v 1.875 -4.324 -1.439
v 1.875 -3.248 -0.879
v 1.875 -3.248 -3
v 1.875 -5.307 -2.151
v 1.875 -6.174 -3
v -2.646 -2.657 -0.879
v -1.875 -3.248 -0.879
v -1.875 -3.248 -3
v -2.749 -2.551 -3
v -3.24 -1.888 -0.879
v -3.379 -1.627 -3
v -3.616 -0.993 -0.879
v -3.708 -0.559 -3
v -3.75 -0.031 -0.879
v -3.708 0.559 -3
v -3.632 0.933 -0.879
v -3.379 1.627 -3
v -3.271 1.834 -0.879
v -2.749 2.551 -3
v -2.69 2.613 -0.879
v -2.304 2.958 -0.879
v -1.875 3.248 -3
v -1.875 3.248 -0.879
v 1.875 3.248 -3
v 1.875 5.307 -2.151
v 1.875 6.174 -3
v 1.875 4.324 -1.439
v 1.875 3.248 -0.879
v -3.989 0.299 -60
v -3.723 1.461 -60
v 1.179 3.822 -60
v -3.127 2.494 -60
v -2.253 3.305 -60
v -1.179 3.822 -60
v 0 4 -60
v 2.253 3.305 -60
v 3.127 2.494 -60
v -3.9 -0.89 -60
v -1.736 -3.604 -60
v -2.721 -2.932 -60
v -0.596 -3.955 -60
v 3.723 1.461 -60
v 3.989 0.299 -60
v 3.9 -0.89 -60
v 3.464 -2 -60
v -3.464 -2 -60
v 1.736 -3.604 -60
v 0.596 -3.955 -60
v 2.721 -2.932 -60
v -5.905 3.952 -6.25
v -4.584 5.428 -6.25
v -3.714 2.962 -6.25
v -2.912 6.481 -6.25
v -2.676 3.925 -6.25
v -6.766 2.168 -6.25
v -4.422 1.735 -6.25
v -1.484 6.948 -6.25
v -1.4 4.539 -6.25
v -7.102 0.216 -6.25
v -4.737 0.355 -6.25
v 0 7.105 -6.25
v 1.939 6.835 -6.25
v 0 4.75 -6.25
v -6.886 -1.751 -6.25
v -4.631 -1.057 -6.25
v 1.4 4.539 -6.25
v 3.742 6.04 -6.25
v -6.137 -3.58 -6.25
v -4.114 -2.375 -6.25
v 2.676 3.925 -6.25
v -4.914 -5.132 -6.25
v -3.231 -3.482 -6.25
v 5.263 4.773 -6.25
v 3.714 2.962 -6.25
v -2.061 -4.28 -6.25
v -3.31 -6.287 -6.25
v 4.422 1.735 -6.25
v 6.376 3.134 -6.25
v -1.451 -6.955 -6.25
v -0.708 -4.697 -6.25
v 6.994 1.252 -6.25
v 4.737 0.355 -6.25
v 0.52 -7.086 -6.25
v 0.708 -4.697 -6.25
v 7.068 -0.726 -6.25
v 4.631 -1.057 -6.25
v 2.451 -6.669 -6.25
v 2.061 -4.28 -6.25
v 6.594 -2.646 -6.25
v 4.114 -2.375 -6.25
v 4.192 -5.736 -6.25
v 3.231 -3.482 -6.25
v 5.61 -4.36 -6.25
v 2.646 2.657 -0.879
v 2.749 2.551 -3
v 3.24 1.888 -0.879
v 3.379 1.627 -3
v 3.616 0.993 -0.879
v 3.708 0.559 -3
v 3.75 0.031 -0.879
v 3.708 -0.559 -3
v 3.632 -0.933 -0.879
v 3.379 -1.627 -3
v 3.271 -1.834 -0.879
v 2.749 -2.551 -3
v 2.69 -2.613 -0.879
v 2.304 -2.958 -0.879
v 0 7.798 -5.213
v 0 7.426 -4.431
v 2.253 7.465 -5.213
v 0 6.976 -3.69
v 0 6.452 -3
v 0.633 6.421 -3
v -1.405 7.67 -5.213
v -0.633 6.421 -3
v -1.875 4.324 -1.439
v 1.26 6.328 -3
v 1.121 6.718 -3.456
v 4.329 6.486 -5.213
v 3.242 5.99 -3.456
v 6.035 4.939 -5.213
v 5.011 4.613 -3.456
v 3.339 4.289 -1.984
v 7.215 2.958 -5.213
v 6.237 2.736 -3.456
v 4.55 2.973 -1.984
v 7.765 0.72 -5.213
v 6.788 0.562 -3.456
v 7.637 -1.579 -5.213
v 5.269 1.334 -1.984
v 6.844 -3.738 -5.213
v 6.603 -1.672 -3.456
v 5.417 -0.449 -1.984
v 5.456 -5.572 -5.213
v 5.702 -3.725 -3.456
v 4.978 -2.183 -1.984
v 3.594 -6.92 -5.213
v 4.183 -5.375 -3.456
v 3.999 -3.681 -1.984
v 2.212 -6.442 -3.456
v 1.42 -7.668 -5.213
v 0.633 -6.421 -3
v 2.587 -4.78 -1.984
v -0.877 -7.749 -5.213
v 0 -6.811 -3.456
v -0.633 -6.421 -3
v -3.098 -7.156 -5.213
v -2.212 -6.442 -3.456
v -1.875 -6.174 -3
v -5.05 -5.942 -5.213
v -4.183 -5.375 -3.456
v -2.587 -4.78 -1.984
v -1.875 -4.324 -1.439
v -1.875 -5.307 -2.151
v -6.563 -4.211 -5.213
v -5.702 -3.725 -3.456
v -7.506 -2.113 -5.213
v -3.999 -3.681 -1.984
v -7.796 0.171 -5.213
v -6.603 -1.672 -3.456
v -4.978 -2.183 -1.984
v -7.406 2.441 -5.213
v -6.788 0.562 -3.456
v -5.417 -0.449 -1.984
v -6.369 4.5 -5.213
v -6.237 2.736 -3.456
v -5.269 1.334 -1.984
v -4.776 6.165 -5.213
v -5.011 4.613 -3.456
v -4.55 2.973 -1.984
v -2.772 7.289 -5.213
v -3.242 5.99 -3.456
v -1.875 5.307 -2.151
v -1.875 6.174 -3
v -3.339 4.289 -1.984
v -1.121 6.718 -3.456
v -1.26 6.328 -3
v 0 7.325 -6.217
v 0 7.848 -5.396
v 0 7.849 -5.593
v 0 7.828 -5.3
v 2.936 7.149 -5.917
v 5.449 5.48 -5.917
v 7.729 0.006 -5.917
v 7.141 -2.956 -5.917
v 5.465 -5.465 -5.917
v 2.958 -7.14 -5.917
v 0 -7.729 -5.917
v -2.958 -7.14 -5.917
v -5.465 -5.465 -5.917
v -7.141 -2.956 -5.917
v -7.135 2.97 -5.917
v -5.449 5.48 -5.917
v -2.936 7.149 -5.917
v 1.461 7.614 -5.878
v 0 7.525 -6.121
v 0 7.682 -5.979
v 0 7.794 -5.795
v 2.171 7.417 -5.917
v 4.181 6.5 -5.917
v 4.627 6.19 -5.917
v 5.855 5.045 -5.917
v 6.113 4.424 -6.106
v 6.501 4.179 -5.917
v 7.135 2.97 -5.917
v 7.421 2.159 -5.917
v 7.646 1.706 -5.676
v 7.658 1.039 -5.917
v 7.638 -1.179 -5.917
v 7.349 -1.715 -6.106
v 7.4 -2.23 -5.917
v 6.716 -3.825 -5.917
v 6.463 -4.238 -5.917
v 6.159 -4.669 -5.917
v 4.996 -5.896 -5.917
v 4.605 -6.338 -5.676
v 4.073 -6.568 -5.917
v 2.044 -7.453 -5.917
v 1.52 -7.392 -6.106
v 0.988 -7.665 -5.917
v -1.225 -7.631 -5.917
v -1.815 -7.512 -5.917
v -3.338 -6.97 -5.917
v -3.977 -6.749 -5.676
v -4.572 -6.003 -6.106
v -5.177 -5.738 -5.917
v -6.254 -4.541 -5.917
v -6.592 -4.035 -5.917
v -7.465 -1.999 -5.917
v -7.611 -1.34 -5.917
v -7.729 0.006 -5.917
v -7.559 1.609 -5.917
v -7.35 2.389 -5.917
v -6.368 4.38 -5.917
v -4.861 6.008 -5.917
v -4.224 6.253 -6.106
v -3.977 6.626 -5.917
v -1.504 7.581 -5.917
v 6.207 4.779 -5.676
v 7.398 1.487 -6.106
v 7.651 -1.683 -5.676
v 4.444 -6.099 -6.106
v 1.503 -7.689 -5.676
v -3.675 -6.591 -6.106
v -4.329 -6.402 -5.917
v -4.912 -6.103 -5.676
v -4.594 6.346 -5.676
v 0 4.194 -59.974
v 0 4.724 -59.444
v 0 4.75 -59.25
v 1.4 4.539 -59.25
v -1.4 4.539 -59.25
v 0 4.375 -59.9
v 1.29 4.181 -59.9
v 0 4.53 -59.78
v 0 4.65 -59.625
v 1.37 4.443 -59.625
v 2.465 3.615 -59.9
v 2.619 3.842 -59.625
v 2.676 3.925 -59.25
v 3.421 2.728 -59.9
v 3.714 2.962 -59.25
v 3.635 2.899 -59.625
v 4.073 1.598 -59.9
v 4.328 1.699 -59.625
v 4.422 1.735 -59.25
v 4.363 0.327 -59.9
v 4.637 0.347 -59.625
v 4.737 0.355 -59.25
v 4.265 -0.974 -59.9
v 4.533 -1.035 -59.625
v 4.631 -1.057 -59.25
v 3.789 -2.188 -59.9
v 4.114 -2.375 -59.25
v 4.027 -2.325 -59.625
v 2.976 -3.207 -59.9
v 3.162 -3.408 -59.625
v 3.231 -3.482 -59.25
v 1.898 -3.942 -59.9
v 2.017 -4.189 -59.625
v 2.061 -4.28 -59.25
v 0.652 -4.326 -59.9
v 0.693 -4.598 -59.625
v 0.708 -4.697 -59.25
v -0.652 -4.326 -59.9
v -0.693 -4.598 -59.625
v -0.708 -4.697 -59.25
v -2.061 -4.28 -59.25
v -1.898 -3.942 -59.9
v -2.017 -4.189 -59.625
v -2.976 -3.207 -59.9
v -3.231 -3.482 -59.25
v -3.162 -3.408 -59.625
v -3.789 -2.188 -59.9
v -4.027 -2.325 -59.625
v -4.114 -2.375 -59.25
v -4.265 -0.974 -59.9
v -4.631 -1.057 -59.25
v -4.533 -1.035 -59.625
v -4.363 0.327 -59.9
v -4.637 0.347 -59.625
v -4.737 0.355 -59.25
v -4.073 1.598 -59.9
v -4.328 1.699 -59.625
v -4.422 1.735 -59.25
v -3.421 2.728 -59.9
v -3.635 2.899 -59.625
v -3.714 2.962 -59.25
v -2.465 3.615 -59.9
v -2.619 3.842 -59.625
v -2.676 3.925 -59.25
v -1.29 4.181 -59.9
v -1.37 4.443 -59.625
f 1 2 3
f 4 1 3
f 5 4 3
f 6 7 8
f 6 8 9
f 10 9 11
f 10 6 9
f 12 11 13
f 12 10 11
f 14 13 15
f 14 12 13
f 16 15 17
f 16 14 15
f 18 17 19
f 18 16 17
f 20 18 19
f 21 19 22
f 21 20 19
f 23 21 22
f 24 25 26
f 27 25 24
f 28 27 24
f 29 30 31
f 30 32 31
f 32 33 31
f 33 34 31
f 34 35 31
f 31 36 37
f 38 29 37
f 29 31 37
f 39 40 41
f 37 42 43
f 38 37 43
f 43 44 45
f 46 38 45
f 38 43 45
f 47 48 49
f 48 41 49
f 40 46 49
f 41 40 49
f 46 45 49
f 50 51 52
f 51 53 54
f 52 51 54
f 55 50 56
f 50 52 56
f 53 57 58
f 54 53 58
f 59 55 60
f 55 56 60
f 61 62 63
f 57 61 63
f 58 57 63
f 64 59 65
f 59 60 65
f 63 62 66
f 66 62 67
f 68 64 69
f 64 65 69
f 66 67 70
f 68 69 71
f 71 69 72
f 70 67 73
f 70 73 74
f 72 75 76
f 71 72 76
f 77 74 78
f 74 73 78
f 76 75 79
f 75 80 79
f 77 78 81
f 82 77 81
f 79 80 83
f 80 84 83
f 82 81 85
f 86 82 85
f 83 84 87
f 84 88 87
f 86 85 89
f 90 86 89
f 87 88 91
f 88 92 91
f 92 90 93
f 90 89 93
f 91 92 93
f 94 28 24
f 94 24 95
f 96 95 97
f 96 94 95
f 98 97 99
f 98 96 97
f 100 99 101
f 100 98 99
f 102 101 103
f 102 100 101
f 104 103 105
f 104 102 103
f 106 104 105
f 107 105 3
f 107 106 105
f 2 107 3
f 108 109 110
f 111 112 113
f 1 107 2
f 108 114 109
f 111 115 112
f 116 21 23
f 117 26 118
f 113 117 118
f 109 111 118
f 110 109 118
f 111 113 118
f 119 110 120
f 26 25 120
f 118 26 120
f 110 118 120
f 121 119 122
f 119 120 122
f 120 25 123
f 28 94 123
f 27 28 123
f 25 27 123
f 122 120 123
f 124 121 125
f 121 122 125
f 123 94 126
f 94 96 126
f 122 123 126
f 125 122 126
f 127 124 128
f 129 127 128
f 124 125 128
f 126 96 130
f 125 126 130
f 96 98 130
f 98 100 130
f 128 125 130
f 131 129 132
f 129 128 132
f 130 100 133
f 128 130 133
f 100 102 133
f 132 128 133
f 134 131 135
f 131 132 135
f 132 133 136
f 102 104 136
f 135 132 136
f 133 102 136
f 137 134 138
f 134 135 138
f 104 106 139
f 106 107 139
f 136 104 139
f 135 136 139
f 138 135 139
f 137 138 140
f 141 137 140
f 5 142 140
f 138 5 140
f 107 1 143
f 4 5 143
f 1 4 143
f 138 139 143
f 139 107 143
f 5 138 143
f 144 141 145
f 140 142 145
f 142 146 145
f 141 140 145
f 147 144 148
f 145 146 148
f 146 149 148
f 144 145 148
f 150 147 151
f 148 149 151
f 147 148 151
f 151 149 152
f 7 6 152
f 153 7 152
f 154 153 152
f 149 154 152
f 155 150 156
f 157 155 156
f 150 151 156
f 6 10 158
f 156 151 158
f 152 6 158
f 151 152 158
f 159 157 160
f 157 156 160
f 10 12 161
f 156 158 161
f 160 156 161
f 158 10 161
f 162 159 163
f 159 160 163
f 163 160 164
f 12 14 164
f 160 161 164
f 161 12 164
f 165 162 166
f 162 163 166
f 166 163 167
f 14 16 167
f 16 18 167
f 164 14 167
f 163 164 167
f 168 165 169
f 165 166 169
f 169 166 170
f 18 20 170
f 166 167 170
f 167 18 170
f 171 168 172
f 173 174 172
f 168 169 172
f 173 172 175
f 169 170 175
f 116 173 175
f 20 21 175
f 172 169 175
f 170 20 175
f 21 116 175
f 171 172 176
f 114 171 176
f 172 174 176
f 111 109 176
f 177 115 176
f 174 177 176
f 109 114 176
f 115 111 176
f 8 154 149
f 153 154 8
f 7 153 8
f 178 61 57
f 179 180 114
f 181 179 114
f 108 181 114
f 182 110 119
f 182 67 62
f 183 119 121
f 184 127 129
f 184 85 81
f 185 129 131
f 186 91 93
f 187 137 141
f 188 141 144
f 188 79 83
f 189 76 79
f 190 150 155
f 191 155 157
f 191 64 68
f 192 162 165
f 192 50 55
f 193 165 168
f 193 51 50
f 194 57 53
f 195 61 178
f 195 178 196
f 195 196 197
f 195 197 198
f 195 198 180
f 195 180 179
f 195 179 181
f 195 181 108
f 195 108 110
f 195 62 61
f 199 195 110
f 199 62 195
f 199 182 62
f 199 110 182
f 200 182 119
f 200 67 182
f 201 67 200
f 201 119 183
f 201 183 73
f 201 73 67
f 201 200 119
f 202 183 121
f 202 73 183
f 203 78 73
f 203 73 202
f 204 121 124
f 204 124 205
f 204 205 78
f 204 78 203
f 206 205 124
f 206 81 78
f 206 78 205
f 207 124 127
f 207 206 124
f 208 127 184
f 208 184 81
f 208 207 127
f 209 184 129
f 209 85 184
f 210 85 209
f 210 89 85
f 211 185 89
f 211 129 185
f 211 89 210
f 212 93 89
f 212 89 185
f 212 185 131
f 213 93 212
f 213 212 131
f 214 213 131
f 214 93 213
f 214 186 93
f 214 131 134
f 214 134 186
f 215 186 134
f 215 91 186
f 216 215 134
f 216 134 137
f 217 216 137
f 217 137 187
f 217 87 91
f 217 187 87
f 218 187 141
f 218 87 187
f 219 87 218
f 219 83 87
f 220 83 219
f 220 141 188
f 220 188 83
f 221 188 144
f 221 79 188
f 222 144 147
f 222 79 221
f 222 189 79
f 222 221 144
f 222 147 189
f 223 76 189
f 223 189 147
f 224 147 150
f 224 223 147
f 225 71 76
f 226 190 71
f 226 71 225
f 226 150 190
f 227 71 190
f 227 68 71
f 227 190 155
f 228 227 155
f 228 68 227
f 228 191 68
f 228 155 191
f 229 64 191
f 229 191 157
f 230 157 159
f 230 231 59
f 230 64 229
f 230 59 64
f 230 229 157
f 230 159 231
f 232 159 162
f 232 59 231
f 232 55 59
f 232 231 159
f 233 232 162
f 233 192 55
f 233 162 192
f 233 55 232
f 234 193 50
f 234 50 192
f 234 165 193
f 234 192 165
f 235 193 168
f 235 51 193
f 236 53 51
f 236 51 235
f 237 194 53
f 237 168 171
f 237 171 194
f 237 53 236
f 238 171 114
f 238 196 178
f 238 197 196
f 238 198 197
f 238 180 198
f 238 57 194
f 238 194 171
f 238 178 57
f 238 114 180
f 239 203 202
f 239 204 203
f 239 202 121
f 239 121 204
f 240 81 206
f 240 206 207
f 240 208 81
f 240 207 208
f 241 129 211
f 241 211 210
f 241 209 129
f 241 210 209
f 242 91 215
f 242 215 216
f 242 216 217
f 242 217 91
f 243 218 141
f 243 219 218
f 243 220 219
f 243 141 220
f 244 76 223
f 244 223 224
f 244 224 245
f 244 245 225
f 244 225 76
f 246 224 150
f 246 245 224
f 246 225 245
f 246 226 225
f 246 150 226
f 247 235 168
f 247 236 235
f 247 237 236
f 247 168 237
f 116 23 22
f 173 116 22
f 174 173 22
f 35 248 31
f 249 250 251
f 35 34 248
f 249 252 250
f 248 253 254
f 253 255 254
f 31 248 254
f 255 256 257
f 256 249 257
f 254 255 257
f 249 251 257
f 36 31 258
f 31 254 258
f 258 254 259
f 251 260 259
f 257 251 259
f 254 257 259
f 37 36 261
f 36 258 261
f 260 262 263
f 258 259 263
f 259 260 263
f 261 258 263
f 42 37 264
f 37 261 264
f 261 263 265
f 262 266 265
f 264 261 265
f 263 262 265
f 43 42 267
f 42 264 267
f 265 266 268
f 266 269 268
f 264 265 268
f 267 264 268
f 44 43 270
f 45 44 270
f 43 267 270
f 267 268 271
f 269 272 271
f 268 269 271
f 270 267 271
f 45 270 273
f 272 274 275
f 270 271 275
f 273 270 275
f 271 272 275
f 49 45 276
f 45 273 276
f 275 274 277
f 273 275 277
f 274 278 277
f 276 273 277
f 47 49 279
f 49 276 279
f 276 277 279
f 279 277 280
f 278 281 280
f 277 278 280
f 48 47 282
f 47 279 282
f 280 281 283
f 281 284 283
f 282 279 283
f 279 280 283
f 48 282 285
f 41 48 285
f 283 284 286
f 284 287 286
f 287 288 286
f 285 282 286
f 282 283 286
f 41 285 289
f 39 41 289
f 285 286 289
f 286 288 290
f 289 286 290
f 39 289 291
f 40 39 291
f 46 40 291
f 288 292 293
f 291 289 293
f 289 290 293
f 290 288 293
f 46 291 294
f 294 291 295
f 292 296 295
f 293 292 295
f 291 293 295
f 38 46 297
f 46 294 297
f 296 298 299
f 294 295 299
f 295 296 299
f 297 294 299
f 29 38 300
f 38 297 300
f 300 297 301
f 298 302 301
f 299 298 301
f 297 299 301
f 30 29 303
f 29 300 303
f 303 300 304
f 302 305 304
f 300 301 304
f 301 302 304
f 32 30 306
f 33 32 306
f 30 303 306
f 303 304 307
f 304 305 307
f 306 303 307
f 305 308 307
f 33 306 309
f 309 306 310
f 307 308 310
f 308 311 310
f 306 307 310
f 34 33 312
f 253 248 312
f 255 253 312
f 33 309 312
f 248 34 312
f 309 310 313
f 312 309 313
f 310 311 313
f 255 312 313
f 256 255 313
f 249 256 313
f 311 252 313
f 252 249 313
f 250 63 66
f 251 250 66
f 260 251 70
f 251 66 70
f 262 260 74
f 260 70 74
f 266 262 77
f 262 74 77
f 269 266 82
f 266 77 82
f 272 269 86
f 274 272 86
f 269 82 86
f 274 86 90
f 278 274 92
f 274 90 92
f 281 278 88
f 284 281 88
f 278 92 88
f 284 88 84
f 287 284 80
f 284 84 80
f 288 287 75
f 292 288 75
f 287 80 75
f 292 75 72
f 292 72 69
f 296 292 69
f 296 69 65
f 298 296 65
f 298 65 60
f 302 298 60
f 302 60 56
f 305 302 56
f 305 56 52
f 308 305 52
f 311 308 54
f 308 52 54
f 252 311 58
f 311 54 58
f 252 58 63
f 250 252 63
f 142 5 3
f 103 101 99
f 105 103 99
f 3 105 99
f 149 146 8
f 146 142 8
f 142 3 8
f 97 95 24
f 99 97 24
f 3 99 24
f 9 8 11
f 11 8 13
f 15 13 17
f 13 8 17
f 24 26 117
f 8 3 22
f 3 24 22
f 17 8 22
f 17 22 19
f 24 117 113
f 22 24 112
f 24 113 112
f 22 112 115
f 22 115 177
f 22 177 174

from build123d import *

# Parameters (mm, degrees)
FILLET1_R          = 0.75
CUT_EXTRUDE2_DEPTH = 3


with BuildPart() as part:
    # Sketch1 → Revolve1 (revolve)
    with BuildSketch(Plane(origin=(0, 0, 0), x_dir=(0, 0, -1), z_dir=(1, 0, 0))):
        with BuildLine():
            Line((0, 0), (60, 0))
            Line((60, 0), (60, 4.75))
            Line((60, 4.75), (6.25, 4.75))
            Line((6.25, 4.75), (6.25, 8.15))
            ThreePointArc((6.25, 8.15), (1.742375921, 5.135294539), (0, 0))
        make_face()
    revolve(axis=Axis((0, 0, 0), (0, 0, -1)))

    # Fillet1
    fillet1_edges = [part.edges().sort_by_distance(p)[0] for p in [
        (0, -8.15, -6.25),
        (0, -4.75, -60),
    ]]
    fillet(fillet1_edges, radius=FILLET1_R)

    # Sketch3 → Cut-Extrude2 (cut)
    with BuildSketch(Plane.XY):
        with BuildLine():
            Line((1.875, -3.247595264), (1.875, -8.652971254))
            Line((1.875, -8.652971254), (-1.875, -8.652971254))
            Line((-1.875, -8.652971254), (-1.875, -3.247595264))
            ThreePointArc((-1.875, -3.247595264), (-3.75, 0), (-1.875, 3.247595264))
            Line((-1.875, 3.247595264), (-1.875, 8.652971254))
            Line((-1.875, 8.652971254), (1.875, 8.652971254))
            Line((1.875, 8.652971254), (1.875, 3.247595264))
            ThreePointArc((1.875, 3.247595264), (3.75, 0), (1.875, -3.247595264))
        make_face()
    extrude(amount=-CUT_EXTRUDE2_DEPTH, mode=Mode.SUBTRACT)


solid = part.part
